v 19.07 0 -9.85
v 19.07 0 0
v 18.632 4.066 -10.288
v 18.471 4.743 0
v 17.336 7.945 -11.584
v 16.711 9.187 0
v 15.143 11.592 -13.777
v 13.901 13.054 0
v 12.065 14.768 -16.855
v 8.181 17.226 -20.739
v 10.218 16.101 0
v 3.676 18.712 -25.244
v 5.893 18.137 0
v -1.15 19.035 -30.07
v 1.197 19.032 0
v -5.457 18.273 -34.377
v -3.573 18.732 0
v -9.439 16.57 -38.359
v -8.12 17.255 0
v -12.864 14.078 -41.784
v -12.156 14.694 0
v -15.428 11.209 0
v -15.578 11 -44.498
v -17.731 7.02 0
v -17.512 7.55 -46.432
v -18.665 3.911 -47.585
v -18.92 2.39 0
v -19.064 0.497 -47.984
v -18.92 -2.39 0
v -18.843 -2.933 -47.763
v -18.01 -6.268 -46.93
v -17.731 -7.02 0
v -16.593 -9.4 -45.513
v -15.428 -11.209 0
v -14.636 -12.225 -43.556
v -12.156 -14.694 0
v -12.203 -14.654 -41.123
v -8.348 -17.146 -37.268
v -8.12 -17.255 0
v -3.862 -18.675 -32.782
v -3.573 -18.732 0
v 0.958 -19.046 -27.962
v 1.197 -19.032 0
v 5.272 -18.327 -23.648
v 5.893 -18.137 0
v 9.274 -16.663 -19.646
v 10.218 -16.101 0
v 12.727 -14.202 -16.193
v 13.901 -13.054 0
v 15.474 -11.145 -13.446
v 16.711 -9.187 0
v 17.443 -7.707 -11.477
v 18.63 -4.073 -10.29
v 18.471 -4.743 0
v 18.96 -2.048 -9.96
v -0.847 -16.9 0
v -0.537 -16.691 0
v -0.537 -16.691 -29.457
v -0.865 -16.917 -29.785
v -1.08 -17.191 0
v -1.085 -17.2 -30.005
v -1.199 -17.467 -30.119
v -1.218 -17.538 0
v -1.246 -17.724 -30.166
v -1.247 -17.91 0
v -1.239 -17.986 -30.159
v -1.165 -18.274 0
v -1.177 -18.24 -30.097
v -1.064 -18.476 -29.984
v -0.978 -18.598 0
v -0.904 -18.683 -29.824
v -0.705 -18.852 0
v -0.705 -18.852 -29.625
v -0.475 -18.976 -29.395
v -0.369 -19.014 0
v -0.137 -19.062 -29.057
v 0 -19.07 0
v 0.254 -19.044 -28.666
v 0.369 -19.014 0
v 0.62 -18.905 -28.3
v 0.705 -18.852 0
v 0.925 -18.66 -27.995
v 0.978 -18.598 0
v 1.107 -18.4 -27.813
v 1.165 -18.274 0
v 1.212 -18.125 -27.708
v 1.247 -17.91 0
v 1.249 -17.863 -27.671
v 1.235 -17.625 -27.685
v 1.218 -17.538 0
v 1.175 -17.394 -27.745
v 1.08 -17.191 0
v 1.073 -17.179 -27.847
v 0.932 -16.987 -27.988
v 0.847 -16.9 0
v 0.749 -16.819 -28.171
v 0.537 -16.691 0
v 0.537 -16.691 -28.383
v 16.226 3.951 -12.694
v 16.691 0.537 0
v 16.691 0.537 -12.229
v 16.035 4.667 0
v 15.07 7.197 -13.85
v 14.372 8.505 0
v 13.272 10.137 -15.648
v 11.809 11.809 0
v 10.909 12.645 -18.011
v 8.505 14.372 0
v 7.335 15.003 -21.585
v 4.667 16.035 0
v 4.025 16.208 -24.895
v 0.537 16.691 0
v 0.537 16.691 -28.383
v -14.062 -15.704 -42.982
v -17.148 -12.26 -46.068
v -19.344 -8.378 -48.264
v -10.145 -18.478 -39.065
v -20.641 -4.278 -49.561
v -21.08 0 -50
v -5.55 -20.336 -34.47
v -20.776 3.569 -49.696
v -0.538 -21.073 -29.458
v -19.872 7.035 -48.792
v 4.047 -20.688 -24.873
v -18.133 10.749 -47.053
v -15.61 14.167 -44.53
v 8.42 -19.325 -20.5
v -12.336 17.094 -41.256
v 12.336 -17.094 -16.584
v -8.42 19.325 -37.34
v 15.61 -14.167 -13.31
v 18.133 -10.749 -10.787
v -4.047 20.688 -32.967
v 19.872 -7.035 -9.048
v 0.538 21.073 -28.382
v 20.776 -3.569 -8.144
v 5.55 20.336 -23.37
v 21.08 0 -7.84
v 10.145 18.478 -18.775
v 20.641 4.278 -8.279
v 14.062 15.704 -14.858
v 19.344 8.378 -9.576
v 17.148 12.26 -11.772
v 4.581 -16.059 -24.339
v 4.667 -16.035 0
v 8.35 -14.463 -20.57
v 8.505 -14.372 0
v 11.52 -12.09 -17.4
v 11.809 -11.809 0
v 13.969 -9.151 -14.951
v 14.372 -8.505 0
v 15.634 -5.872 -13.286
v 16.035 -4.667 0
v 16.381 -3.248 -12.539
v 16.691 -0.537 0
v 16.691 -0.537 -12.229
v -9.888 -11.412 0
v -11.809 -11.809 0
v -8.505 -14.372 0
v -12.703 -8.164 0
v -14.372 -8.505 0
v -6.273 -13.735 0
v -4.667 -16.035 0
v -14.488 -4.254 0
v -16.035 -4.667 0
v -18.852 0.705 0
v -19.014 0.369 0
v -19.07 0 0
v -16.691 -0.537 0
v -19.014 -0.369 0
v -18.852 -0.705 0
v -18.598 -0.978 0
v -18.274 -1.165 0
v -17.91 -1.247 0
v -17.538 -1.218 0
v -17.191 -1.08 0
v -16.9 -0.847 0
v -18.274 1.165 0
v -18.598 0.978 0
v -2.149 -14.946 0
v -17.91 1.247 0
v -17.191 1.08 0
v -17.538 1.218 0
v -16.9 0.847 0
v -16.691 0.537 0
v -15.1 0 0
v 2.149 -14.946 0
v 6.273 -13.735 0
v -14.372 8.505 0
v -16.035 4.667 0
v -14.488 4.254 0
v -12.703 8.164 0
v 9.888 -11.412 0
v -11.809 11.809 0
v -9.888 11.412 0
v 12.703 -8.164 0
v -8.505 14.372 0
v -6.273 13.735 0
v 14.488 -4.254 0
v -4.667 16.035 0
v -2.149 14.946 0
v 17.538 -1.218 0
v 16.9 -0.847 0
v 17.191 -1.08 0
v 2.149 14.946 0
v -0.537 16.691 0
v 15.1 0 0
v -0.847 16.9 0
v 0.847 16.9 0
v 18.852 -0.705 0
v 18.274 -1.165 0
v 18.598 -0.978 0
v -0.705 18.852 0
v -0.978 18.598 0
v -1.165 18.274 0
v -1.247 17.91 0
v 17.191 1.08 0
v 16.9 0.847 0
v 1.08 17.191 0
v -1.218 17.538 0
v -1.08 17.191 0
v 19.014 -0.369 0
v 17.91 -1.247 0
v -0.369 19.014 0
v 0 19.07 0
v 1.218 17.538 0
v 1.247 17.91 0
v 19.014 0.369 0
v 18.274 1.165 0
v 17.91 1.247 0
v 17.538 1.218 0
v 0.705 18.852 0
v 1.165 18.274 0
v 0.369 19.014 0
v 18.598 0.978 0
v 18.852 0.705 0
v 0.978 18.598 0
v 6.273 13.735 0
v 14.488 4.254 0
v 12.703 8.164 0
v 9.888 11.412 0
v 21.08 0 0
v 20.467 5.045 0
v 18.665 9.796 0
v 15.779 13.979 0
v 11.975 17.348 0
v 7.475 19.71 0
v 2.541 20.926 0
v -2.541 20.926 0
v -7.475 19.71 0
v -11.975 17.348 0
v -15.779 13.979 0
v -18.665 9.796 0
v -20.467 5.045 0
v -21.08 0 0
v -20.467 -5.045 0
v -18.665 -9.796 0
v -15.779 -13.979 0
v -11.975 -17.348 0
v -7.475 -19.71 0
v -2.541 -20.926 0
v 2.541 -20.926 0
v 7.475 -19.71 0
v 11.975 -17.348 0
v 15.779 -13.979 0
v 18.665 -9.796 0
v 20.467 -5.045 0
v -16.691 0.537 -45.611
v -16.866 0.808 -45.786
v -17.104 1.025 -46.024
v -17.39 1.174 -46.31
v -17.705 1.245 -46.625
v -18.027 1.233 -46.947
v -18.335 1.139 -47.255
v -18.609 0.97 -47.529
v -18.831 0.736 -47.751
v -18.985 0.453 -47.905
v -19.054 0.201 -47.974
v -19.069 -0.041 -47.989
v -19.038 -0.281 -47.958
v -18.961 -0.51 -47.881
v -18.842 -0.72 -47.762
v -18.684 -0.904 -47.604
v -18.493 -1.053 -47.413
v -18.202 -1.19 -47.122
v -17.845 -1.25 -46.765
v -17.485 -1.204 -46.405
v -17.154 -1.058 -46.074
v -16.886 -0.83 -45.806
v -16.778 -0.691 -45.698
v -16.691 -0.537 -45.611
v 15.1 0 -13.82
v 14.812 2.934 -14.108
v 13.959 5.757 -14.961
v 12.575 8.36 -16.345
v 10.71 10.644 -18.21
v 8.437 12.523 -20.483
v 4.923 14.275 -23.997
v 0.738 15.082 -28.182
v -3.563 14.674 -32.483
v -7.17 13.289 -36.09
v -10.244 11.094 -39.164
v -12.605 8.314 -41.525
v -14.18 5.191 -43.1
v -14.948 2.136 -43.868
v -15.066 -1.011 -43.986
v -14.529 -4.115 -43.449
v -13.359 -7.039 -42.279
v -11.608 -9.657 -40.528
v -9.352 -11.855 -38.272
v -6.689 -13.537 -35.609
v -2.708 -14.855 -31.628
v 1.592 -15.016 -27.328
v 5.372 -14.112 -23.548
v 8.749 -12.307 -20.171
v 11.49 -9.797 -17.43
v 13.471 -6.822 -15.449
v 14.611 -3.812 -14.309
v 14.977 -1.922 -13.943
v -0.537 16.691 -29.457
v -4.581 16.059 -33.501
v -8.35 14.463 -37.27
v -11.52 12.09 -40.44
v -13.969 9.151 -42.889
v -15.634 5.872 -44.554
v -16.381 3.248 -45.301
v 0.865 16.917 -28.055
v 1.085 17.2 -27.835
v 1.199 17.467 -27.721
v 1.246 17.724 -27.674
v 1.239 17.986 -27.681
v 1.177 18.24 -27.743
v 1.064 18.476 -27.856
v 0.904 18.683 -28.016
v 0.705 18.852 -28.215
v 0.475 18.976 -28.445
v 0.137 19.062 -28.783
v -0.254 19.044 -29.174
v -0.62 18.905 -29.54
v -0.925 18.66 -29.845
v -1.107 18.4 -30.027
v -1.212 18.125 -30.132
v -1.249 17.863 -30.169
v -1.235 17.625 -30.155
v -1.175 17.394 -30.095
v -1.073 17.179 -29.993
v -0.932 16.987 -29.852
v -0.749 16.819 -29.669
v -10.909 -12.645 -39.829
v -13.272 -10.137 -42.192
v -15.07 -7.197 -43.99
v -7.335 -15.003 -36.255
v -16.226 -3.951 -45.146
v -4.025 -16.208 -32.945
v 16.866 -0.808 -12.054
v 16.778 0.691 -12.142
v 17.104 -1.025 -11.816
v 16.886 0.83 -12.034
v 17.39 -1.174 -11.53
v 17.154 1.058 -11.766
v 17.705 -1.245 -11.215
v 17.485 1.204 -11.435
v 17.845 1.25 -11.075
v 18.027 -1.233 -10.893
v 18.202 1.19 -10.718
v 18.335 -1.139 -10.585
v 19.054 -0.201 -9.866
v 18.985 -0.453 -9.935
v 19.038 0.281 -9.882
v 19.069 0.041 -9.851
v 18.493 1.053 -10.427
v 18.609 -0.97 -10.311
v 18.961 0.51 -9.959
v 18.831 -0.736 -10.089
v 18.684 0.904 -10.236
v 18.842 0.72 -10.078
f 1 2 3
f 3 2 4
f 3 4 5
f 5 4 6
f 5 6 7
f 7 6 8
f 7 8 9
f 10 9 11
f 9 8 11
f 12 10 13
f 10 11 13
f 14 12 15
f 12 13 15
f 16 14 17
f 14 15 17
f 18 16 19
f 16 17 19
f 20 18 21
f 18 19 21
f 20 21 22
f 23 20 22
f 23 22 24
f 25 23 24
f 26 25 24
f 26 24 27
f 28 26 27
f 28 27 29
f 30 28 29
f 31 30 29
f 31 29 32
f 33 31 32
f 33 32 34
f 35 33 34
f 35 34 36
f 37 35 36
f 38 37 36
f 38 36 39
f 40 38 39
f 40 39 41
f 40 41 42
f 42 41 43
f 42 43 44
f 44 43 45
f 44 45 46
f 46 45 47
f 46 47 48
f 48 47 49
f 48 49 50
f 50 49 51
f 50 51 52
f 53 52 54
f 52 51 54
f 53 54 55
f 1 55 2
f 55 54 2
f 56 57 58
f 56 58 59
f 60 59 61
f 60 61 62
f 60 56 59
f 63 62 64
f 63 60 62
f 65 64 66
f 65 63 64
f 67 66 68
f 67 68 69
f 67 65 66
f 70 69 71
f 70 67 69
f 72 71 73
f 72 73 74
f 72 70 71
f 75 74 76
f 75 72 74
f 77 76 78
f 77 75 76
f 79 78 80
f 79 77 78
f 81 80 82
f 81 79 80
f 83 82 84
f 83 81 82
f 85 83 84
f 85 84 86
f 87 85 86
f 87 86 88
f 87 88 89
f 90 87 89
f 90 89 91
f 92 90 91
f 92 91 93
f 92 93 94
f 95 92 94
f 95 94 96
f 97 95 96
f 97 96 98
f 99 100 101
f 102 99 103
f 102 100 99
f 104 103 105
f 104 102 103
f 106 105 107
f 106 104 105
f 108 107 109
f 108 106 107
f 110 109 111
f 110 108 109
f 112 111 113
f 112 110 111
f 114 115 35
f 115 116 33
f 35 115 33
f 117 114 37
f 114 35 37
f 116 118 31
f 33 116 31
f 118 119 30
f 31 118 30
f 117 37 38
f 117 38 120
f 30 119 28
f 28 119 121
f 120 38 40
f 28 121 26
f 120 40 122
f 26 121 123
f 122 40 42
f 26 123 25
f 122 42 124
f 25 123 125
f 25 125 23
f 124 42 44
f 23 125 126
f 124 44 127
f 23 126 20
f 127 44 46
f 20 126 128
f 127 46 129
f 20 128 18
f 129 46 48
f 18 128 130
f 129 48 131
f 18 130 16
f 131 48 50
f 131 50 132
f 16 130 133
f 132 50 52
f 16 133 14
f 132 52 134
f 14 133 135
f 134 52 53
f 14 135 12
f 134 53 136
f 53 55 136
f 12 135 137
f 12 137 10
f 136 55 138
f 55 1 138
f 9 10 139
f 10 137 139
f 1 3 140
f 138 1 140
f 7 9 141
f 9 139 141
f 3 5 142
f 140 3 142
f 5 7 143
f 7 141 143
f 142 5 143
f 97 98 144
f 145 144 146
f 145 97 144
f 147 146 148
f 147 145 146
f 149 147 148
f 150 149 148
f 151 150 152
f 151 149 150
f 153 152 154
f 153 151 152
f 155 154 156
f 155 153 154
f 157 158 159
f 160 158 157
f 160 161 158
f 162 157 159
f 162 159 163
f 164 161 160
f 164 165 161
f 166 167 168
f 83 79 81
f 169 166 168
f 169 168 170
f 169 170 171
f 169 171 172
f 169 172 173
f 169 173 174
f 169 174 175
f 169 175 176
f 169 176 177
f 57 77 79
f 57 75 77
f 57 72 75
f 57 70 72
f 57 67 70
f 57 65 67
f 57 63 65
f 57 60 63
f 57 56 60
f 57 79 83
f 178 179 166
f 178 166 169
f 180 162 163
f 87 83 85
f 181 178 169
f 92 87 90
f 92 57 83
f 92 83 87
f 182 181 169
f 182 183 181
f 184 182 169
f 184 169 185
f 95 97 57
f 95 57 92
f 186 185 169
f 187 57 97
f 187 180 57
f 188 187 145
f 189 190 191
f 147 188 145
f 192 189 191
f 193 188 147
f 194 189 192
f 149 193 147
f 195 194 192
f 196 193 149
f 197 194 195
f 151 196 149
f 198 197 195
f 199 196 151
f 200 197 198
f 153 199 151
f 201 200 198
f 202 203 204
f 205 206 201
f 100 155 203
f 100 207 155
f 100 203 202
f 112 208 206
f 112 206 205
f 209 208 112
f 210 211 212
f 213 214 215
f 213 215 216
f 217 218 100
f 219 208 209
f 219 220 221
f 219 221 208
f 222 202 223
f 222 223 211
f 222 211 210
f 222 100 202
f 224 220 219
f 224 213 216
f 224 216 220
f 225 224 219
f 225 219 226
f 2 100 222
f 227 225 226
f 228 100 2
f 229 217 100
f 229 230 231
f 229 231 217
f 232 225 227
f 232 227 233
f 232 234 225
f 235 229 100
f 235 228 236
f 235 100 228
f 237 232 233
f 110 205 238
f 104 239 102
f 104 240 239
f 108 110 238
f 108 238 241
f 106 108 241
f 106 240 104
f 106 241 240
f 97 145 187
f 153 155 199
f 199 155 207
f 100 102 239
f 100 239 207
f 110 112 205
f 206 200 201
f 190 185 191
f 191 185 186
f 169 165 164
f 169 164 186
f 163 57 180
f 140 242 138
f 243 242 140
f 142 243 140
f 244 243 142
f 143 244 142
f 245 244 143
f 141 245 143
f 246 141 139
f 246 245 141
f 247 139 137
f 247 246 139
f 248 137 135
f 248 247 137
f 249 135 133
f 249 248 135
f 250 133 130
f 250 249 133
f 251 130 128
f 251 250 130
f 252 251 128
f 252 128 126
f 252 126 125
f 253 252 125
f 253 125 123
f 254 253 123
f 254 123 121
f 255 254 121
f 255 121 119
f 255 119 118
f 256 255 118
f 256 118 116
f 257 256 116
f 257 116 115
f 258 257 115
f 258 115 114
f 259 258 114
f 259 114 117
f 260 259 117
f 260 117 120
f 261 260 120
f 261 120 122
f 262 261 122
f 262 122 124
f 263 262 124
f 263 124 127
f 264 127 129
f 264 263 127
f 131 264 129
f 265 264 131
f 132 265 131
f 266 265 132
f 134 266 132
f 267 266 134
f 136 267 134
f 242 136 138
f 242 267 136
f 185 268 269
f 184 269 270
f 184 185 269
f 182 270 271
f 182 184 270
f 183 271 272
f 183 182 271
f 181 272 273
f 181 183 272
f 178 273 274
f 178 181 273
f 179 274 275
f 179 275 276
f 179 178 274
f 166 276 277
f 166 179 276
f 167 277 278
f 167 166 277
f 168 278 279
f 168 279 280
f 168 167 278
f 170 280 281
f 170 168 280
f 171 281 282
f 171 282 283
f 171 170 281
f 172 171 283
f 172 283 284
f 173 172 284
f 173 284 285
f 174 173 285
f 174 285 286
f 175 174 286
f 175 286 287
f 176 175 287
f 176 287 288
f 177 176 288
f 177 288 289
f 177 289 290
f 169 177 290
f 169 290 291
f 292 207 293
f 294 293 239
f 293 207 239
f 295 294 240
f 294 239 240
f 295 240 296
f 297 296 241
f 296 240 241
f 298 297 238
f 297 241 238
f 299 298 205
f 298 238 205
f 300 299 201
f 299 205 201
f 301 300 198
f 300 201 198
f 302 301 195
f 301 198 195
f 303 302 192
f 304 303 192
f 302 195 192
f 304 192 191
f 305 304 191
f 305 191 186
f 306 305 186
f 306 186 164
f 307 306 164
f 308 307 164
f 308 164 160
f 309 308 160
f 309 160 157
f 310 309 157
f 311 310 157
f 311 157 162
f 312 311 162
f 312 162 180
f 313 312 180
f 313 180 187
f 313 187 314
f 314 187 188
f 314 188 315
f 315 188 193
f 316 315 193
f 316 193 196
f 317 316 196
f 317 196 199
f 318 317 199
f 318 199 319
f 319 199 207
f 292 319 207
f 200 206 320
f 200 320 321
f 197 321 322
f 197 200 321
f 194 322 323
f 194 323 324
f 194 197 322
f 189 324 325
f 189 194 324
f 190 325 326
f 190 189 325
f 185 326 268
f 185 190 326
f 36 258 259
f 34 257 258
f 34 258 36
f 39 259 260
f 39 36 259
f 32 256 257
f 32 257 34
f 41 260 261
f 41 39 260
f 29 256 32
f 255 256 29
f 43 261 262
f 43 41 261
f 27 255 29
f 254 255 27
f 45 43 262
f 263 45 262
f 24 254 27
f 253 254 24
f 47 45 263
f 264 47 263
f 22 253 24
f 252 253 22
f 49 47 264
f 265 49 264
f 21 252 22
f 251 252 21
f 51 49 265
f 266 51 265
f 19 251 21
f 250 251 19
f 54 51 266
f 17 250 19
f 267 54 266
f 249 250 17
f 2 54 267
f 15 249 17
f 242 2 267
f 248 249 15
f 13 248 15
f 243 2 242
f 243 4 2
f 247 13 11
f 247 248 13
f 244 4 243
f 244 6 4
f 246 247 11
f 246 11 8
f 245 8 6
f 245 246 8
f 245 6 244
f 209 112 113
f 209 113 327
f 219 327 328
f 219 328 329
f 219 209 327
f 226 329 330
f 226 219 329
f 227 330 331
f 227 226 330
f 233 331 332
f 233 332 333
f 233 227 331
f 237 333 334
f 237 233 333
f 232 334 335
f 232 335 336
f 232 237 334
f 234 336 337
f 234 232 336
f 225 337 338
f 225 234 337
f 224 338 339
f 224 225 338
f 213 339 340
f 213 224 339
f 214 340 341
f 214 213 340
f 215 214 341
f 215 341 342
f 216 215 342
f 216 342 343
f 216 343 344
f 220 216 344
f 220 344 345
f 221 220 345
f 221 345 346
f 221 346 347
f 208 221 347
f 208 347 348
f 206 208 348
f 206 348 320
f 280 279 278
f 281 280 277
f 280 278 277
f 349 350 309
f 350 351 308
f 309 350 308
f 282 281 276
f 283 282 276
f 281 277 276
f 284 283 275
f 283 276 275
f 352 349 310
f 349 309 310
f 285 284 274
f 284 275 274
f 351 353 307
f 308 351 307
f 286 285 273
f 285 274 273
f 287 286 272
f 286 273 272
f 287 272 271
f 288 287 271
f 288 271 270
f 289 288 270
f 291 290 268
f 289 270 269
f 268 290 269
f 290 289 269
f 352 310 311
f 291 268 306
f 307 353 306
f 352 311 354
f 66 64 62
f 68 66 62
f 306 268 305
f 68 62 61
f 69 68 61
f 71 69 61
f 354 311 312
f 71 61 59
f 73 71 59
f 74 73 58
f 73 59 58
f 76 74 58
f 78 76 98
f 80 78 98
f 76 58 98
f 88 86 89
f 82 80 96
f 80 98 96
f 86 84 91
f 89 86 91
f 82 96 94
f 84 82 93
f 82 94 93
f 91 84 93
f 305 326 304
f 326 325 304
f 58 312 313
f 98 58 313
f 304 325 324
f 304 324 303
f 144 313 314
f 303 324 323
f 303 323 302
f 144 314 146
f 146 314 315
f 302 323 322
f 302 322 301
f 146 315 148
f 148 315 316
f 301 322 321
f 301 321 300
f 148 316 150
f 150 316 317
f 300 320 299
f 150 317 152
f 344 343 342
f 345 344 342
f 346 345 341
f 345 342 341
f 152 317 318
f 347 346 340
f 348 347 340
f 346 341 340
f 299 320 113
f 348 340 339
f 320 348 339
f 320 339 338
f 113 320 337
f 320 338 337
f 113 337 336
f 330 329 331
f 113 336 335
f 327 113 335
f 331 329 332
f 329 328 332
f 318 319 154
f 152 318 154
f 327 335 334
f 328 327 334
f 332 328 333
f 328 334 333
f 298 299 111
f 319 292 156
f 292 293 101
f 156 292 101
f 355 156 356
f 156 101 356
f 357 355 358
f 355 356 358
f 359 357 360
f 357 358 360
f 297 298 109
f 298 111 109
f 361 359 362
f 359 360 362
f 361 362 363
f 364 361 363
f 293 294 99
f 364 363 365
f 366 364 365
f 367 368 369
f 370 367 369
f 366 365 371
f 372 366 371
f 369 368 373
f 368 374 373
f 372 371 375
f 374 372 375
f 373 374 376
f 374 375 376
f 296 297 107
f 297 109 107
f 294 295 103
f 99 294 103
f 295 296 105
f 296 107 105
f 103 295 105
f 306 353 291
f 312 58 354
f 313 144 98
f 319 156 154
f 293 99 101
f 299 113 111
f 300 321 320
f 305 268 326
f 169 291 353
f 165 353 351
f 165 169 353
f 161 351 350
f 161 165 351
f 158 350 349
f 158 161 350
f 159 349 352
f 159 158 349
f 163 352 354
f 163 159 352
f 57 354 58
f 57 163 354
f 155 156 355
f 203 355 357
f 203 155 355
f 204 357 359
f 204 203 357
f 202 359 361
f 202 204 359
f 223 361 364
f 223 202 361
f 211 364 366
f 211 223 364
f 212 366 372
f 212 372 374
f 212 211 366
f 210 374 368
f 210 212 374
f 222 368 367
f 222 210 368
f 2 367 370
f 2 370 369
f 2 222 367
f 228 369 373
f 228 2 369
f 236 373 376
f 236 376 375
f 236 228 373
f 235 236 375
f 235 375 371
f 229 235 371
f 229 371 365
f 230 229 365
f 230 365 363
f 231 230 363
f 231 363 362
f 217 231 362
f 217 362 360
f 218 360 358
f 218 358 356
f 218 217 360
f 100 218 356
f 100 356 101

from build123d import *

# Parameters (mm, degrees)
SKETCH1_R           = 21.08
SKETCH1_R_2         = 19.07
BOSS_EXTRUDE1_DEPTH = 50
SKETCH3_R           = 16.7
SKETCH3_R_2         = 15.1
BOSS_EXTRUDE2_DEPTH = 50
SKETCH4_R           = 1.25
BOSS_EXTRUDE3_DEPTH = 50
CUT_EXTRUDE1_DEPTH  = 76.5


with BuildPart() as part:
    # Sketch1 → Boss-Extrude1 (new body)
    with BuildSketch(Plane.XY):
        Circle(SKETCH1_R)
        Circle(SKETCH1_R_2, mode=Mode.SUBTRACT)
    extrude(amount=-BOSS_EXTRUDE1_DEPTH)


with BuildPart() as body_2:
    # Sketch3 → Boss-Extrude2 (new body)
    with BuildSketch(Plane.XY):
        Circle(SKETCH3_R)
        Circle(SKETCH3_R_2, mode=Mode.SUBTRACT)
    extrude(amount=-BOSS_EXTRUDE2_DEPTH)

    # Sketch4 → Boss-Extrude3 (add)
    with BuildSketch(Plane.XY):
        with Locations((0, -17.82)):
            Circle(SKETCH4_R)
        with Locations((-17.82, 0)):
            Circle(SKETCH4_R)
        with Locations((0, 17.82)):
            Circle(SKETCH4_R)
        with Locations((17.82, 0)):
            Circle(SKETCH4_R)
    extrude(amount=-BOSS_EXTRUDE3_DEPTH)


with BuildPart() as cut_extrude1_tool:
    # Sketch2 → Cut-Extrude1 (new body, symmetric)
    with BuildSketch(Plane(origin=(0, 0, 0), x_dir=(1, 0, 0), z_dir=(0, 1, 0))):
        Polygon((-21.08, 50), (21.08, 7.84), (21.08, 50), align=None)
    extrude(amount=CUT_EXTRUDE1_DEPTH, both=True)


with BuildPart() as part_1:
    add(part.part)

    # Cut-Extrude1: cut by cut_extrude1_tool
    add(cut_extrude1_tool.part, mode=Mode.SUBTRACT)


with BuildPart() as body_2_1:
    add(body_2.part)

    # Cut-Extrude1: cut by cut_extrude1_tool
    add(cut_extrude1_tool.part, mode=Mode.SUBTRACT)


solid = Compound([part_1.part, body_2_1.part])
